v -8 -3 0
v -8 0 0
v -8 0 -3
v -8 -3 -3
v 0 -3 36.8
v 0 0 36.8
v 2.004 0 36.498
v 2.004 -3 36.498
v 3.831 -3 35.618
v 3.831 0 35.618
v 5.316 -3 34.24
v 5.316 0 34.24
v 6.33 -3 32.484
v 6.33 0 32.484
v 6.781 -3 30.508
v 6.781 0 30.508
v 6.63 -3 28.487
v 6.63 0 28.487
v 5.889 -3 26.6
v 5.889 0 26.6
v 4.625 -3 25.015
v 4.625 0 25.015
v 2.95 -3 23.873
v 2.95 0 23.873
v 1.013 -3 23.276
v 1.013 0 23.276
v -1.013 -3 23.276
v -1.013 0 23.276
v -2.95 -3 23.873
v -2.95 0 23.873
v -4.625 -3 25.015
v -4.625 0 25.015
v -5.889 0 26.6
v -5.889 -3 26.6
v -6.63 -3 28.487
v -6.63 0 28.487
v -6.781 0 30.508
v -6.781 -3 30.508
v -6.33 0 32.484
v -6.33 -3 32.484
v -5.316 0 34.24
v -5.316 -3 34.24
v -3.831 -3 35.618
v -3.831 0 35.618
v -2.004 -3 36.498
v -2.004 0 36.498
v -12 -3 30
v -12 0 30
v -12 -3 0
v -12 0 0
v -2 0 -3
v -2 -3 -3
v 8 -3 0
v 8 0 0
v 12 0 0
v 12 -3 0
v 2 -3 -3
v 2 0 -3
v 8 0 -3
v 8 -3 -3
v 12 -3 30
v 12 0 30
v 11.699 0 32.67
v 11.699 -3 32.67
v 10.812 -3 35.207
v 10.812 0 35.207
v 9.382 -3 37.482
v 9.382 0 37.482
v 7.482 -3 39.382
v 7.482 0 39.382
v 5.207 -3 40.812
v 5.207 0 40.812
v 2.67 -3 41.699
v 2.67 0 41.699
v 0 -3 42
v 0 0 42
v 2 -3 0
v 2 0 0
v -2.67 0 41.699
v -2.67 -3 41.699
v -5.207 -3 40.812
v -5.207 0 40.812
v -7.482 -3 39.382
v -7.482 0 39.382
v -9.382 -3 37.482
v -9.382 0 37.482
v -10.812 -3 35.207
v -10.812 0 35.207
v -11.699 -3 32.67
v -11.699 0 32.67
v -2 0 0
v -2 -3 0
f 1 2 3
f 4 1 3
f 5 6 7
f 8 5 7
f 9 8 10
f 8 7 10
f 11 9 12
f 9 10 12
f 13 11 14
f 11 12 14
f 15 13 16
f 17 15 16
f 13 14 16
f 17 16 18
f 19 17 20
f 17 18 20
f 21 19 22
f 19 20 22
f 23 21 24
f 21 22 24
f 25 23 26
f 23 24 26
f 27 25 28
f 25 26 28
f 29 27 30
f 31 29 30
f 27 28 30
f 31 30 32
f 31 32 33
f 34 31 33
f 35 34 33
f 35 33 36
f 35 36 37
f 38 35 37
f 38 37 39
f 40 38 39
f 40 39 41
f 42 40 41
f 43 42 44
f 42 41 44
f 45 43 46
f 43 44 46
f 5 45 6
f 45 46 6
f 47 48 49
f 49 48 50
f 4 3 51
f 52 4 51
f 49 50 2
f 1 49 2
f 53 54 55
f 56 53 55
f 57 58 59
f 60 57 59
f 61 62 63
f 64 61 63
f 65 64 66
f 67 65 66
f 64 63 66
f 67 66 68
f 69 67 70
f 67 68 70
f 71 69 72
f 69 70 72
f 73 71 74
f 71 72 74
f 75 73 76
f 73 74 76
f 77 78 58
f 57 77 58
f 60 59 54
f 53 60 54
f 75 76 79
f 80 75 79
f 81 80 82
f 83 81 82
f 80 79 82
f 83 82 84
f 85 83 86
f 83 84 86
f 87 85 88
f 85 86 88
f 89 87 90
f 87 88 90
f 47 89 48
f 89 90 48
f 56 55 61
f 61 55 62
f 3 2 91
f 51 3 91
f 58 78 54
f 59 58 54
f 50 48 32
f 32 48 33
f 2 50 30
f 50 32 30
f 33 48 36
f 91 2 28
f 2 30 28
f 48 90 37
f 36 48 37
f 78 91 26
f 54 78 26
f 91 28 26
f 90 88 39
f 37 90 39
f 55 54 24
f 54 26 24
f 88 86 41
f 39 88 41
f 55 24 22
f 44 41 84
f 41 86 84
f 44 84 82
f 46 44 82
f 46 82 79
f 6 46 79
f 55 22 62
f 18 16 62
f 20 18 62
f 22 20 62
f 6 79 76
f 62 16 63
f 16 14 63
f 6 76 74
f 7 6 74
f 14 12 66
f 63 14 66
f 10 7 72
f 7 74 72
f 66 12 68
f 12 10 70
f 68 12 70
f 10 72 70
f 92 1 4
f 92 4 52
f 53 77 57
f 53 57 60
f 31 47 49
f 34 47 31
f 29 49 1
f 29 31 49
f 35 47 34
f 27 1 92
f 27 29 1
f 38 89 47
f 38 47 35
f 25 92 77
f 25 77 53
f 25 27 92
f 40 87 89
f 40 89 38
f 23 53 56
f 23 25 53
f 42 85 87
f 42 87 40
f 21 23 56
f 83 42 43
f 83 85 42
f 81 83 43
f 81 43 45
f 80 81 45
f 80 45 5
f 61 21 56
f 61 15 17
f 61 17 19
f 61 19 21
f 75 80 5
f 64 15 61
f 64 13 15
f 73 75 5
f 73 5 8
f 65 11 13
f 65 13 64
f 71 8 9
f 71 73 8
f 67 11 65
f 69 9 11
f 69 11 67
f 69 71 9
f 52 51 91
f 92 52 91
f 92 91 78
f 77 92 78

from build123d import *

# Parameters (mm, degrees)
F1_DEPTH = 3


with BuildPart() as f1:
    # F0 (on Front) → F1 (new body)
    with BuildSketch(Plane.XZ):
        with BuildLine():
            Line((-2, 0), (0, 0))
            Line((0, 0), (2, 0))
            Line((2, 0), (2, -3))
            Line((2, -3), (8, -3))
            Line((8, -3), (8, 0))
            Line((8, 0), (12, 0))
            Line((12, 0), (12, 30))
            ThreePointArc((12, 30), (8.485281, 38.485281), (0, 42))
            ThreePointArc((0, 42), (-8.485281, 38.485281), (-12, 30))
            Line((-12, 30), (-12, 0))
            Line((-12, 0), (-8, 0))
            Line((-8, 0), (-8, -3))
            Line((-8, -3), (-2, -3))
            Line((-2, -3), (-2, 0))
        make_face()
        with BuildLine():
            ThreePointArc((0, 23.2), (-6.8, 30), (0, 36.8))
            ThreePointArc((0, 36.8), (6.8, 30), (0, 23.2))
        make_face(mode=Mode.SUBTRACT)
    extrude(amount=F1_DEPTH)


solid = f1.part
